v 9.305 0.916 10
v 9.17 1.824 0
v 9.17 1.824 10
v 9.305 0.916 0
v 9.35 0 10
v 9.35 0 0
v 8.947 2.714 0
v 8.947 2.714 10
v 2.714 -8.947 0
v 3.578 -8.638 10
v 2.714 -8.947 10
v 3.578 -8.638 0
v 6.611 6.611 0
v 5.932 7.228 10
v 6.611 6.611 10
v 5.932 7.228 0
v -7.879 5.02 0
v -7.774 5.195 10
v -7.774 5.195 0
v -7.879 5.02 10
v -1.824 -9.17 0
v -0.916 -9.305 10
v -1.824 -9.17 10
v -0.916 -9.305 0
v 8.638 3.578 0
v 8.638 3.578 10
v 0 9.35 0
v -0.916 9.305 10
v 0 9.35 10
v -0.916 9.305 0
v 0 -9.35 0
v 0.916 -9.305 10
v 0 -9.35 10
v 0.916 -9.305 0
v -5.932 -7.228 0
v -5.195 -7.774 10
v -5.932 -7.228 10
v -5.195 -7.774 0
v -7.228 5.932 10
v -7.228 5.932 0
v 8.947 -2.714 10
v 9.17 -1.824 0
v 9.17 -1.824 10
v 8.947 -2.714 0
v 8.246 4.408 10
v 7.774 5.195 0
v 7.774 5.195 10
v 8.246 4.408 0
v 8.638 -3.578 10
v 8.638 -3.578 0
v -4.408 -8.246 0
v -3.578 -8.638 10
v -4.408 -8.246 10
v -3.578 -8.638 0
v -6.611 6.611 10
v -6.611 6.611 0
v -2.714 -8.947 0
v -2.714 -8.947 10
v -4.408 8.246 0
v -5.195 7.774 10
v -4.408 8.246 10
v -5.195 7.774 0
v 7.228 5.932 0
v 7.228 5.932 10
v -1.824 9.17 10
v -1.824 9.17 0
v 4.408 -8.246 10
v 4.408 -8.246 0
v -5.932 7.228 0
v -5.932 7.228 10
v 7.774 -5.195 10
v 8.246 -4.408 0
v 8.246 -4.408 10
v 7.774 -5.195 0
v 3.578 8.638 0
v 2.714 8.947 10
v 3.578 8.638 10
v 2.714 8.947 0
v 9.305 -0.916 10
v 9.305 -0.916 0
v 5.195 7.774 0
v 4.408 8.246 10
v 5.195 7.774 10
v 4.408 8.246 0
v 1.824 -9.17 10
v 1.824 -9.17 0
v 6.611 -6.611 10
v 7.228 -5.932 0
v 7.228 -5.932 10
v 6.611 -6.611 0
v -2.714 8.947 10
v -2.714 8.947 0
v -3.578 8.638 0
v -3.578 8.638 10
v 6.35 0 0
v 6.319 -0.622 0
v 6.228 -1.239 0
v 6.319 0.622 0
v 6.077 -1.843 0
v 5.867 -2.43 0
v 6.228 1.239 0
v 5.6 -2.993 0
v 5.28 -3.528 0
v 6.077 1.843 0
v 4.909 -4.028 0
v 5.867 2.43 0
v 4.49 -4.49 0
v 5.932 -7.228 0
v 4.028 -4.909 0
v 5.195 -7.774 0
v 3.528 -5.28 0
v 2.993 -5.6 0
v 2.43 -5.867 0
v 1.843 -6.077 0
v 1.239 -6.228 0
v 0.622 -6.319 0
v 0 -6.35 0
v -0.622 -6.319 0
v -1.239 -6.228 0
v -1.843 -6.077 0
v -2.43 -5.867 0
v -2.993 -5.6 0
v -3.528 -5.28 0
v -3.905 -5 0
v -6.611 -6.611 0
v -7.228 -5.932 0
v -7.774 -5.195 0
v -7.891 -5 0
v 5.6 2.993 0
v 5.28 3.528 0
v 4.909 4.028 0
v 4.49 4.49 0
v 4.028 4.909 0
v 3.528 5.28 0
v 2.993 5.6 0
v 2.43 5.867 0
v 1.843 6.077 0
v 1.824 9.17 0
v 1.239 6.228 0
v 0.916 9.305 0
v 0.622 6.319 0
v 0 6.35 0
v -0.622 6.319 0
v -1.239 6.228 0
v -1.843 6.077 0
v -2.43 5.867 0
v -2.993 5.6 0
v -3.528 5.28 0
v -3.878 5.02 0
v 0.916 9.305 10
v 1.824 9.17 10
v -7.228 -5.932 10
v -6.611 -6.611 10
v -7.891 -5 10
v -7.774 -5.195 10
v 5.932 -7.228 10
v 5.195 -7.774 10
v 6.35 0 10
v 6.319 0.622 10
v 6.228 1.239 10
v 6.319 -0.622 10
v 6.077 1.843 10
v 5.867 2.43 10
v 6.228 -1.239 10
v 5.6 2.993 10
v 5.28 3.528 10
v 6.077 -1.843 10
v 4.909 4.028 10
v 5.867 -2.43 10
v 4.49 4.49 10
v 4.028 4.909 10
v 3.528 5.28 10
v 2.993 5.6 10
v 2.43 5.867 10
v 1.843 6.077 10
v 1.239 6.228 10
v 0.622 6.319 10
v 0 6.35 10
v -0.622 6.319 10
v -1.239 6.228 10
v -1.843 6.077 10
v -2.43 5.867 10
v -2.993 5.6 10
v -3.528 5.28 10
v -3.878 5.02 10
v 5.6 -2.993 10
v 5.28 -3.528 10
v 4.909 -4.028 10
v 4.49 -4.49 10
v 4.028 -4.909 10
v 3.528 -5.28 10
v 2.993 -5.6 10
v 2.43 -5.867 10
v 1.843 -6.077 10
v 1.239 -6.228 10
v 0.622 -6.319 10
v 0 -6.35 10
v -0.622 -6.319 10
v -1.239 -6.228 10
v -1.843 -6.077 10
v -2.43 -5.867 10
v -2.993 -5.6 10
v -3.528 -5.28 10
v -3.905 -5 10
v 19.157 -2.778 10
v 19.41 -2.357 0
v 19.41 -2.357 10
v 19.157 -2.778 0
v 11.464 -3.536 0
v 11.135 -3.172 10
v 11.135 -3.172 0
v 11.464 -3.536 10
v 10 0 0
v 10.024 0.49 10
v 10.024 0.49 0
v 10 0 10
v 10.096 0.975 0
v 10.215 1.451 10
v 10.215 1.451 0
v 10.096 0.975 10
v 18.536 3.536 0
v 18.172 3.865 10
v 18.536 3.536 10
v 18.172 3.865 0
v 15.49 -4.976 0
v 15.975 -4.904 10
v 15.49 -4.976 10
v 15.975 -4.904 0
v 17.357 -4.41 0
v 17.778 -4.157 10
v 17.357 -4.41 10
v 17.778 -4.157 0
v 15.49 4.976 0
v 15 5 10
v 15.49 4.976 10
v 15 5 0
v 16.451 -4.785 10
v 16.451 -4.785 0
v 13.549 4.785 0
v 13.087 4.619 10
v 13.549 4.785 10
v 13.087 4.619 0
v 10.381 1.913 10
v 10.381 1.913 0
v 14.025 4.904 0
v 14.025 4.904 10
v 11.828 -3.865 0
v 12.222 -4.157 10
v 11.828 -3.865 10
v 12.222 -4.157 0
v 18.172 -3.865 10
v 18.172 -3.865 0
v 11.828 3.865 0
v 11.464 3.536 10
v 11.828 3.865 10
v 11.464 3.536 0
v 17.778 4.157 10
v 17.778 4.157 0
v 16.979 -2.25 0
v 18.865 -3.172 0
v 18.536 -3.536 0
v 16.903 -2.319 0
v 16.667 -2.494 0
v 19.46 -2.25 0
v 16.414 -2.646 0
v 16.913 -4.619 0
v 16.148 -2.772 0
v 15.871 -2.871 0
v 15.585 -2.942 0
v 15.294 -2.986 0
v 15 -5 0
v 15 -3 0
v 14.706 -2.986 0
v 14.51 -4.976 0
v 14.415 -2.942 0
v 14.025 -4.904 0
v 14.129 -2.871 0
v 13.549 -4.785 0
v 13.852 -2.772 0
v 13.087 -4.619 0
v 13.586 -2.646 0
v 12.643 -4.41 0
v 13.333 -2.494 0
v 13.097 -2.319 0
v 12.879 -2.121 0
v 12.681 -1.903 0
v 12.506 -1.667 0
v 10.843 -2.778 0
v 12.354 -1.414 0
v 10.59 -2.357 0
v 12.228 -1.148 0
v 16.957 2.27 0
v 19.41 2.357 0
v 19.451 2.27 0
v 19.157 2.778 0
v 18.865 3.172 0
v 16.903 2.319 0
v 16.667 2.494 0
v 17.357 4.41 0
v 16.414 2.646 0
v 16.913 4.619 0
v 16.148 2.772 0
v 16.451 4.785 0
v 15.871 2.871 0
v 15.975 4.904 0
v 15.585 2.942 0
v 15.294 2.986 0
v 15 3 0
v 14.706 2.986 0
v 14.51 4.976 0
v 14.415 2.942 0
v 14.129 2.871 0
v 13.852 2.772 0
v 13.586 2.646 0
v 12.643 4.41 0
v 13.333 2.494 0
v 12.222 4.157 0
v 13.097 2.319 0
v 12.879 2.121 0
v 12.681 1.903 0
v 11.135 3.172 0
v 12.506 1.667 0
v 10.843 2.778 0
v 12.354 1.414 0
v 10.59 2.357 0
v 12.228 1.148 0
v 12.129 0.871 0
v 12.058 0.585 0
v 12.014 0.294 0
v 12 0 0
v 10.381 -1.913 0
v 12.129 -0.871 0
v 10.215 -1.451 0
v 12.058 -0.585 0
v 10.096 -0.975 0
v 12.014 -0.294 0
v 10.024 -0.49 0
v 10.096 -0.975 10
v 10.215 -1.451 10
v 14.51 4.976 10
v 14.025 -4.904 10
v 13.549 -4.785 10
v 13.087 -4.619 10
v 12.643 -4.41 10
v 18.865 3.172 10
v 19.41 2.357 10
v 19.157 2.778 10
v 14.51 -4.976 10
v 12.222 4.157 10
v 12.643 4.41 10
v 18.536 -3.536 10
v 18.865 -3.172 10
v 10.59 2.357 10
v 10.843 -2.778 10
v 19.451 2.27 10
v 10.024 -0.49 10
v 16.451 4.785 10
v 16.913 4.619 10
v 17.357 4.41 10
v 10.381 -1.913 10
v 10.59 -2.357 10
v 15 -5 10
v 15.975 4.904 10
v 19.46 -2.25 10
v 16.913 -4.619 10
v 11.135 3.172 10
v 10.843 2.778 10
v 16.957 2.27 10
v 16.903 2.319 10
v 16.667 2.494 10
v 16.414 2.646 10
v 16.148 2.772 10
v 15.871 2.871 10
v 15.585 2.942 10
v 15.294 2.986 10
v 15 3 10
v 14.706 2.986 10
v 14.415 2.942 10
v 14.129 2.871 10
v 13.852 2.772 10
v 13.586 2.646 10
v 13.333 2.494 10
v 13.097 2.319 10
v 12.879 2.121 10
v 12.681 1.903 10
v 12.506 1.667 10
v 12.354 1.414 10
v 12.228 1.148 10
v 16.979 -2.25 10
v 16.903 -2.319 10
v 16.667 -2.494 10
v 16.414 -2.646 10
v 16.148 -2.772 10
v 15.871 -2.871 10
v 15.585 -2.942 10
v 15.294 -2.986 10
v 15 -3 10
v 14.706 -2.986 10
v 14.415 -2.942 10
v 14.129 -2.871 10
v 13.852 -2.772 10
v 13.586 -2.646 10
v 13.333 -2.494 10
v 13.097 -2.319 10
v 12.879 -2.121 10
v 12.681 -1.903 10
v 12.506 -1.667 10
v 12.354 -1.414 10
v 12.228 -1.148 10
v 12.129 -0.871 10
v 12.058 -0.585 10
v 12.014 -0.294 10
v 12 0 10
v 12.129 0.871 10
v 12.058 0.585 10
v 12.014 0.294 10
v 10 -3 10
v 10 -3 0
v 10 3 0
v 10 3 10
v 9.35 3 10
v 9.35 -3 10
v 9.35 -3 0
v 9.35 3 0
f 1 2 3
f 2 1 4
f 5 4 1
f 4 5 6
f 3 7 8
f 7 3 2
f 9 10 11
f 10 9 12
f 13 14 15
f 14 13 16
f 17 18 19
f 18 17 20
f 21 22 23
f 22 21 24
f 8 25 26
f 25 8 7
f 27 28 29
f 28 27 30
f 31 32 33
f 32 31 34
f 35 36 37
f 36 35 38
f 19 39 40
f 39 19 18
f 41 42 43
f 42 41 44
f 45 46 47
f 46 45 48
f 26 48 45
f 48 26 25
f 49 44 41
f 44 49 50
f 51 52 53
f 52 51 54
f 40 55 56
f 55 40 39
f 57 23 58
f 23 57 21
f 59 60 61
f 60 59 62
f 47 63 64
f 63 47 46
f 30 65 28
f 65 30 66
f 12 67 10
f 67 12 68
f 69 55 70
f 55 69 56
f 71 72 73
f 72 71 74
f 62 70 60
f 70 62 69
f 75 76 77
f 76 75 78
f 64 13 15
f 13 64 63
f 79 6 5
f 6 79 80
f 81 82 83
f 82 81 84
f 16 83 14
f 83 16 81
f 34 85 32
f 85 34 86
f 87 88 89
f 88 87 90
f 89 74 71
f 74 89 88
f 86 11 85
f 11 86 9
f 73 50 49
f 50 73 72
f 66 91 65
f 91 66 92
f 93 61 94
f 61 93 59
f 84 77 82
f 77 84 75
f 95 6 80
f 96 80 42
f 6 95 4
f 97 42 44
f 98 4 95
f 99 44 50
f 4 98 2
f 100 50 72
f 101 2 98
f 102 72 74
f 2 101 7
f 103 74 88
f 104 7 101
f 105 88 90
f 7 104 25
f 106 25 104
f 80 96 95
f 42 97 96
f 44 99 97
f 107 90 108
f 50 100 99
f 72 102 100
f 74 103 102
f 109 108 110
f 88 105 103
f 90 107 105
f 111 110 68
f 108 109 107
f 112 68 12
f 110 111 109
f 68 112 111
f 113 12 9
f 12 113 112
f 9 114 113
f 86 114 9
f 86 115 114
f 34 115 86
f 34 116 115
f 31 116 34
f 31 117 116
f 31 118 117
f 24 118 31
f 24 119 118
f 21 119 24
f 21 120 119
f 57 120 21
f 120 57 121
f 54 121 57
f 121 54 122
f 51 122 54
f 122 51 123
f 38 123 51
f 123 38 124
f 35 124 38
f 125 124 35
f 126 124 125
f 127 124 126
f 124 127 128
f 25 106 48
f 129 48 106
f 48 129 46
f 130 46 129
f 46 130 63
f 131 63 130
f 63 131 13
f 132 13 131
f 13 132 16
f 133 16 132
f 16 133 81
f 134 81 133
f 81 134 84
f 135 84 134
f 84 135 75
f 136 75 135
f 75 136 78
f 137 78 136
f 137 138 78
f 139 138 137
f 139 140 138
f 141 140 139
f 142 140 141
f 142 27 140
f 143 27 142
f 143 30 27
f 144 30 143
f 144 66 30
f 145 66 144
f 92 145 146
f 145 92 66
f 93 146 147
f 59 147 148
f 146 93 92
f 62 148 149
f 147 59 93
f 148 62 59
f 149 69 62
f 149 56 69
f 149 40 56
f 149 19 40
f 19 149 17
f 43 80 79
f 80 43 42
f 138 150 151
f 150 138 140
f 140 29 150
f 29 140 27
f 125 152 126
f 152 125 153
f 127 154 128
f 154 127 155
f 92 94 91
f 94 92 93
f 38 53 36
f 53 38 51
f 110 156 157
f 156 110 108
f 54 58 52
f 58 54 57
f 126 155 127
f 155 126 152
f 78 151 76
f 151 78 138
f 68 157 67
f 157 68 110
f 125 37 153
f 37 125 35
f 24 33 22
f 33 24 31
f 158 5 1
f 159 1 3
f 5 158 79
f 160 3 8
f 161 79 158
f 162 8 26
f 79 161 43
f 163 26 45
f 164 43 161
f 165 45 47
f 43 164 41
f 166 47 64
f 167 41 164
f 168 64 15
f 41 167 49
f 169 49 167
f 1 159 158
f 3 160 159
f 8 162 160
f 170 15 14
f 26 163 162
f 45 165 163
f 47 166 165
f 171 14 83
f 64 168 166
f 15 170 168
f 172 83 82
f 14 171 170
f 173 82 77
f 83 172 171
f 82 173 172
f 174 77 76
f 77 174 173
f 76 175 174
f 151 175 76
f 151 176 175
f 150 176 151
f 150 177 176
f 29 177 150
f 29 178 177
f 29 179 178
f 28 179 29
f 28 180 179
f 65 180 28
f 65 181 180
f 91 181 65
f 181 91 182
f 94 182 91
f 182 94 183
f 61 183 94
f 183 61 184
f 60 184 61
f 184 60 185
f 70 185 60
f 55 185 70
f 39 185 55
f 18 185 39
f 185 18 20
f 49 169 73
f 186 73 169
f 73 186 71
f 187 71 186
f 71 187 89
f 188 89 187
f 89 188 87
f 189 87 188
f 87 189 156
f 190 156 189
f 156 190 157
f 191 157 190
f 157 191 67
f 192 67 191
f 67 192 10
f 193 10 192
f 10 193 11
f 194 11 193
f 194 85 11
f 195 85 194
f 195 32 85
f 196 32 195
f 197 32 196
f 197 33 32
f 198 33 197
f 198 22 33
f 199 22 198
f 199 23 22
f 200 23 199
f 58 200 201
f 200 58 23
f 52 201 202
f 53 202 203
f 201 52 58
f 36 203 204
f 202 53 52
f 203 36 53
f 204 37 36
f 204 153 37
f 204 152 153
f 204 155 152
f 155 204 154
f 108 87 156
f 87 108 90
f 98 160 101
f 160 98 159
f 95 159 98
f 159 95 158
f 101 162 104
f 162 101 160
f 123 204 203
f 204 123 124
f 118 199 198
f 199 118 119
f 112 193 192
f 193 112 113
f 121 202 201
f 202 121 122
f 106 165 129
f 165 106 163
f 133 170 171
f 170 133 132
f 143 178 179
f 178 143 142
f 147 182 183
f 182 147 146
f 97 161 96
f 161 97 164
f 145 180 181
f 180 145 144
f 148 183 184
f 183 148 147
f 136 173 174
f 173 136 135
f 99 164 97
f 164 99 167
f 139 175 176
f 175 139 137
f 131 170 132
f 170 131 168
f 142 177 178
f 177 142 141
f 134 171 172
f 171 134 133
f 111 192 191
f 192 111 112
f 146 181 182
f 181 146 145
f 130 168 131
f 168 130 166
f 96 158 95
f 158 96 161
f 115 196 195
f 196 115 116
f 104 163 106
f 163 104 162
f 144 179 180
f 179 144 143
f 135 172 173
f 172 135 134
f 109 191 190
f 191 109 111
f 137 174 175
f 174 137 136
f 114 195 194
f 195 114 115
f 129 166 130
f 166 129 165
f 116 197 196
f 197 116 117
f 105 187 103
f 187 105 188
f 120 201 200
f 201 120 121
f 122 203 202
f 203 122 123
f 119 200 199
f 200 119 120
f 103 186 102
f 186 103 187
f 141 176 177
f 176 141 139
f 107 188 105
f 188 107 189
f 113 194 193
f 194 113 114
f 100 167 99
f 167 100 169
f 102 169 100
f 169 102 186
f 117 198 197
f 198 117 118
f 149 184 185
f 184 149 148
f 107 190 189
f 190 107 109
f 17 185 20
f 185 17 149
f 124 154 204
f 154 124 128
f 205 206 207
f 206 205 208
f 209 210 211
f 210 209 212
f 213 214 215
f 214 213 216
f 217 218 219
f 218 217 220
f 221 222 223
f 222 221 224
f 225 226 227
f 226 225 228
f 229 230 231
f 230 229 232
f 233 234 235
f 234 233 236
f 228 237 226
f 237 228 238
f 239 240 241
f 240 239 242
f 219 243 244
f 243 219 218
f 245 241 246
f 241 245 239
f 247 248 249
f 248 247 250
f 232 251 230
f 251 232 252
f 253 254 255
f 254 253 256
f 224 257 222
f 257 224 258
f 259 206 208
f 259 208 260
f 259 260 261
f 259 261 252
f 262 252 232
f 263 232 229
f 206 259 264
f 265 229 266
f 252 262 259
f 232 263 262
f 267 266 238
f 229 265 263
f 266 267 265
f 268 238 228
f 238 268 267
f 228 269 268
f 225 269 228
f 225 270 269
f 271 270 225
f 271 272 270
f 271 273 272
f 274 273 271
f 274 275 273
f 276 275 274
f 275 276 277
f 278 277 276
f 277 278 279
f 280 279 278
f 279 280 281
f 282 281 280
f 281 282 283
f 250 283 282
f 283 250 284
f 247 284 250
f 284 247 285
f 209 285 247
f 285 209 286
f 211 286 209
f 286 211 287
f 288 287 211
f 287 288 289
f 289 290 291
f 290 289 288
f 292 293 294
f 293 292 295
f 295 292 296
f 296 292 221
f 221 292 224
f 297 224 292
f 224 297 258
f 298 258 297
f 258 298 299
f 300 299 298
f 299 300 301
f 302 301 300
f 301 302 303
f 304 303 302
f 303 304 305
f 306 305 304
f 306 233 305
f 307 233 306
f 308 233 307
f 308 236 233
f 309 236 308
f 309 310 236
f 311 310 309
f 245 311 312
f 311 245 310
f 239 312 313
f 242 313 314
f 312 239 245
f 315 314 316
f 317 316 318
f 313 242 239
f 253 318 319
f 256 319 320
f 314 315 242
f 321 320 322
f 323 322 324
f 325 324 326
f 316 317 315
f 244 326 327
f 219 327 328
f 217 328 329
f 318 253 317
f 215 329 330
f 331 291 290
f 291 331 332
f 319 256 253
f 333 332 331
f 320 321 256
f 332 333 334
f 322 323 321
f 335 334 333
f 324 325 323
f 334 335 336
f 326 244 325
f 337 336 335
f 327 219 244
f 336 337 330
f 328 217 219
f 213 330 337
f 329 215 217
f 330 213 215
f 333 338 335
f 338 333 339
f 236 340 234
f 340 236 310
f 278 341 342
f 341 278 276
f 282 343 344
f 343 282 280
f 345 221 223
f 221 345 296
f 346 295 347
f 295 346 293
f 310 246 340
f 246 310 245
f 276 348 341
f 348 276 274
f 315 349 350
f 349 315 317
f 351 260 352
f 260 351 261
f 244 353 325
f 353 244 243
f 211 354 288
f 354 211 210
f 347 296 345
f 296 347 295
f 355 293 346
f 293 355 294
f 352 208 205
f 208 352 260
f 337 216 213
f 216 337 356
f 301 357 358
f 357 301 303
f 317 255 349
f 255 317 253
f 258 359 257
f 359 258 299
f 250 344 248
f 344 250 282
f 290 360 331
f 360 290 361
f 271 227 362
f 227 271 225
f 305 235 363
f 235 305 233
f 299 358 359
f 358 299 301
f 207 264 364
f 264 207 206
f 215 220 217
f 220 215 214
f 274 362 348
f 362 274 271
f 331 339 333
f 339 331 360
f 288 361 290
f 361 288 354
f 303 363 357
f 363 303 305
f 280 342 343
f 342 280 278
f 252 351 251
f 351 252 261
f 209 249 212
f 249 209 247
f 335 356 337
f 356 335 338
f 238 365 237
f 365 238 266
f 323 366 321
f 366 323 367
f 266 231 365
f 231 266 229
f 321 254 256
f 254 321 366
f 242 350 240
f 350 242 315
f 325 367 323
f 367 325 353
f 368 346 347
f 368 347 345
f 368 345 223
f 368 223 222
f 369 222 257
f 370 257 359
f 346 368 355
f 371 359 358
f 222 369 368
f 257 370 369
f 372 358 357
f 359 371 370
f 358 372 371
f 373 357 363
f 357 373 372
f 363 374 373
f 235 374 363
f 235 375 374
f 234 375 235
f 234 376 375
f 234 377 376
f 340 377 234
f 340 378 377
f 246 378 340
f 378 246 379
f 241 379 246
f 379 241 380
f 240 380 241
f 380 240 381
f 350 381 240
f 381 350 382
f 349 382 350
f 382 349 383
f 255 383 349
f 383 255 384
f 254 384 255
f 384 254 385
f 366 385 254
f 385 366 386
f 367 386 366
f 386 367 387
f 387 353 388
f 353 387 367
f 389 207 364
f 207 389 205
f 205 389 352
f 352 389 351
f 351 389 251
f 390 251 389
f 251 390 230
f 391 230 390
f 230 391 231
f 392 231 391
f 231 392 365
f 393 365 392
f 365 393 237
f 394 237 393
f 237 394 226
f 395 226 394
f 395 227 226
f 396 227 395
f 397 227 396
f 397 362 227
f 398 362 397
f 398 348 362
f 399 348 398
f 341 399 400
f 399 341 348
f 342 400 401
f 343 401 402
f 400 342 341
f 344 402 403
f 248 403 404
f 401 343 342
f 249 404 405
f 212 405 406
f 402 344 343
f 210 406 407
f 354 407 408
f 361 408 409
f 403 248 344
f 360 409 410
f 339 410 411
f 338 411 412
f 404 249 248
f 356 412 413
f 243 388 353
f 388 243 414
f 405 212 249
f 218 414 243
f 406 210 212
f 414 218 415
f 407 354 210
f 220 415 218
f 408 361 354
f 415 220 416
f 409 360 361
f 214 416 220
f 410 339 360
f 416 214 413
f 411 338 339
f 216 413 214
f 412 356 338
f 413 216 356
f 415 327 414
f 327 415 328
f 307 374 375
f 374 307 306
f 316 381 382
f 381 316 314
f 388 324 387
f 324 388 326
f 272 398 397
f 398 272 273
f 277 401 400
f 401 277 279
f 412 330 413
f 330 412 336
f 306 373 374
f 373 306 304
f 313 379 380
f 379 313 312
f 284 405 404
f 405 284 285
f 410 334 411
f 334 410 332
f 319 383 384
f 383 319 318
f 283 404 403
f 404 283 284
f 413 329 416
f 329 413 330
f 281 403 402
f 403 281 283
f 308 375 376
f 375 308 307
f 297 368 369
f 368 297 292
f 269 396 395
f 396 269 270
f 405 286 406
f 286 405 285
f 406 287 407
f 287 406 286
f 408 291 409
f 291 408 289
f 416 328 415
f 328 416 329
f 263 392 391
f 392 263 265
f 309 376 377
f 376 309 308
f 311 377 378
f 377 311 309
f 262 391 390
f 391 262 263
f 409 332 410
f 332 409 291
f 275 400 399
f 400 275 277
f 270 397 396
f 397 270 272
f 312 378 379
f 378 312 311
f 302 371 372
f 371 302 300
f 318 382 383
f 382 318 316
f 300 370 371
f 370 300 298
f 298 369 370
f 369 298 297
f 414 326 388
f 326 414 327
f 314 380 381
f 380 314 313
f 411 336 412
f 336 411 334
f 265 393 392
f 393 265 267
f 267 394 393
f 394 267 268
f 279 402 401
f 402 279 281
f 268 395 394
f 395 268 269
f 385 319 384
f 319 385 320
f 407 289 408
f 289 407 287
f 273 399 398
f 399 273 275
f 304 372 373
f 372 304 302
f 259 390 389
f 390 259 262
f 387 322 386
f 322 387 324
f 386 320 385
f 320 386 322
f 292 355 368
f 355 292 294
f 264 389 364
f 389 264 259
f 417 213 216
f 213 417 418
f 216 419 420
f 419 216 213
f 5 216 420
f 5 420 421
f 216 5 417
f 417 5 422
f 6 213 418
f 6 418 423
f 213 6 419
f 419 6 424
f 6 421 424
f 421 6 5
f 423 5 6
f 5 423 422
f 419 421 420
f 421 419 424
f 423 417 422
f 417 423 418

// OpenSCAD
$fn = 64;

// Dimensions
rod_id = 12.7;        // inner diameter of rod ring (mm)
rod_wall = 3;         // wall thickness of rod ring (mm)
rod_od = rod_id + 2 * rod_wall;  // outer diameter of rod ring (mm)
rod_ring_height = 10; // height of the entire part (Z)

tubing_id = 6;        // inner diameter of tubing ring (mm)
tubing_wall = 2;      // wall thickness of tubing ring (mm)
tubing_od = tubing_id + 2 * tubing_wall; // outer diameter of tubing ring (mm)

bridge_width = 6;     // width in Y-direction of the bridge (mm)
bridge_x_start = 8;   // start x-coordinate of bridge
bridge_x_end = 12;    // end x-coordinate of bridge

// Opening cut dimensions
rod_opening_width = 10;   // width of rod ring opening (mm)
tubing_opening_width = 4.5; // width of tubing ring opening (mm)

// Calculate y-limits for cuts
rod_cut_y = rod_opening_width / 2;
tubing_cut_y = tubing_opening_width / 2;

// Rod ring (outer circle minus inner circle) at z=0 to z=10
module rod_ring_with_cut() {
    difference() {
        // Outer circle at z=0 to z=10
        cylinder(h = rod_ring_height, r = rod_od / 2);
        // Inner circle (hole)
        translate([0, 0, -0.01])
            cylinder(h = rod_ring_height + 0.02, r = rod_id / 2);
        // Opening cut: remove x < 0 and -5 < y < 5
        // The opening is on the -X side, so we cut from x = -rod_od to x = 0
        translate([-rod_od - 1, -rod_cut_y, -0.01])
            cube([rod_od + 1.02, rod_opening_width + 0.02, rod_ring_height + 0.02]);
    }
}

module tubing_ring_with_cut() {
    // Position tubing ring at x = 15, y = 0, z=0 to z=10
    translate([15, 0, 0]) {
        difference() {
            // Outer circle at z=0 to z=10
            cylinder(h = rod_ring_height, r = tubing_od / 2);
            // Inner circle (hole)
            translate([0, 0, -0.01])
                cylinder(h = rod_ring_height + 0.02, r = tubing_id / 2);
            // Opening cut: remove x > 15 and -2.25 < y < 2.25
            // The opening is on the +X side, so we cut from x = 15 to x = 15 + something
            translate([0.01, -tubing_cut_y, -0.01])
                cube([tubing_od + 1.02, tubing_opening_width + 0.02, rod_ring_height + 0.02]);
        }
    }
}

module bridge() {
    // Bridge between rod ring and tubing ring
    // y-range: -bridge_width/2 to +bridge_width/2 (6 mm wide in Y)
    // x-range: from rod ring outer edge (rod_od/2) to tubing ring inner edge (15 - tubing_od/2)
    // but constrained to [bridge_x_start, bridge_x_end]
    x_start = max(bridge_x_start, rod_od / 2);
    x_end = min(bridge_x_end, 15 - tubing_od / 2);
    
    if (x_start < x_end) {
        // Bridge is a rectangular prism: width in X (x_end - x_start), height in Y (bridge_width), height in Z (rod_ring_height)
        translate([x_start, -bridge_width/2, 0])
            cube([x_end - x_start, bridge_width, rod_ring_height]);
    }
}

// Assemble the part
rod_ring_with_cut();
tubing_ring_with_cut();
bridge();
